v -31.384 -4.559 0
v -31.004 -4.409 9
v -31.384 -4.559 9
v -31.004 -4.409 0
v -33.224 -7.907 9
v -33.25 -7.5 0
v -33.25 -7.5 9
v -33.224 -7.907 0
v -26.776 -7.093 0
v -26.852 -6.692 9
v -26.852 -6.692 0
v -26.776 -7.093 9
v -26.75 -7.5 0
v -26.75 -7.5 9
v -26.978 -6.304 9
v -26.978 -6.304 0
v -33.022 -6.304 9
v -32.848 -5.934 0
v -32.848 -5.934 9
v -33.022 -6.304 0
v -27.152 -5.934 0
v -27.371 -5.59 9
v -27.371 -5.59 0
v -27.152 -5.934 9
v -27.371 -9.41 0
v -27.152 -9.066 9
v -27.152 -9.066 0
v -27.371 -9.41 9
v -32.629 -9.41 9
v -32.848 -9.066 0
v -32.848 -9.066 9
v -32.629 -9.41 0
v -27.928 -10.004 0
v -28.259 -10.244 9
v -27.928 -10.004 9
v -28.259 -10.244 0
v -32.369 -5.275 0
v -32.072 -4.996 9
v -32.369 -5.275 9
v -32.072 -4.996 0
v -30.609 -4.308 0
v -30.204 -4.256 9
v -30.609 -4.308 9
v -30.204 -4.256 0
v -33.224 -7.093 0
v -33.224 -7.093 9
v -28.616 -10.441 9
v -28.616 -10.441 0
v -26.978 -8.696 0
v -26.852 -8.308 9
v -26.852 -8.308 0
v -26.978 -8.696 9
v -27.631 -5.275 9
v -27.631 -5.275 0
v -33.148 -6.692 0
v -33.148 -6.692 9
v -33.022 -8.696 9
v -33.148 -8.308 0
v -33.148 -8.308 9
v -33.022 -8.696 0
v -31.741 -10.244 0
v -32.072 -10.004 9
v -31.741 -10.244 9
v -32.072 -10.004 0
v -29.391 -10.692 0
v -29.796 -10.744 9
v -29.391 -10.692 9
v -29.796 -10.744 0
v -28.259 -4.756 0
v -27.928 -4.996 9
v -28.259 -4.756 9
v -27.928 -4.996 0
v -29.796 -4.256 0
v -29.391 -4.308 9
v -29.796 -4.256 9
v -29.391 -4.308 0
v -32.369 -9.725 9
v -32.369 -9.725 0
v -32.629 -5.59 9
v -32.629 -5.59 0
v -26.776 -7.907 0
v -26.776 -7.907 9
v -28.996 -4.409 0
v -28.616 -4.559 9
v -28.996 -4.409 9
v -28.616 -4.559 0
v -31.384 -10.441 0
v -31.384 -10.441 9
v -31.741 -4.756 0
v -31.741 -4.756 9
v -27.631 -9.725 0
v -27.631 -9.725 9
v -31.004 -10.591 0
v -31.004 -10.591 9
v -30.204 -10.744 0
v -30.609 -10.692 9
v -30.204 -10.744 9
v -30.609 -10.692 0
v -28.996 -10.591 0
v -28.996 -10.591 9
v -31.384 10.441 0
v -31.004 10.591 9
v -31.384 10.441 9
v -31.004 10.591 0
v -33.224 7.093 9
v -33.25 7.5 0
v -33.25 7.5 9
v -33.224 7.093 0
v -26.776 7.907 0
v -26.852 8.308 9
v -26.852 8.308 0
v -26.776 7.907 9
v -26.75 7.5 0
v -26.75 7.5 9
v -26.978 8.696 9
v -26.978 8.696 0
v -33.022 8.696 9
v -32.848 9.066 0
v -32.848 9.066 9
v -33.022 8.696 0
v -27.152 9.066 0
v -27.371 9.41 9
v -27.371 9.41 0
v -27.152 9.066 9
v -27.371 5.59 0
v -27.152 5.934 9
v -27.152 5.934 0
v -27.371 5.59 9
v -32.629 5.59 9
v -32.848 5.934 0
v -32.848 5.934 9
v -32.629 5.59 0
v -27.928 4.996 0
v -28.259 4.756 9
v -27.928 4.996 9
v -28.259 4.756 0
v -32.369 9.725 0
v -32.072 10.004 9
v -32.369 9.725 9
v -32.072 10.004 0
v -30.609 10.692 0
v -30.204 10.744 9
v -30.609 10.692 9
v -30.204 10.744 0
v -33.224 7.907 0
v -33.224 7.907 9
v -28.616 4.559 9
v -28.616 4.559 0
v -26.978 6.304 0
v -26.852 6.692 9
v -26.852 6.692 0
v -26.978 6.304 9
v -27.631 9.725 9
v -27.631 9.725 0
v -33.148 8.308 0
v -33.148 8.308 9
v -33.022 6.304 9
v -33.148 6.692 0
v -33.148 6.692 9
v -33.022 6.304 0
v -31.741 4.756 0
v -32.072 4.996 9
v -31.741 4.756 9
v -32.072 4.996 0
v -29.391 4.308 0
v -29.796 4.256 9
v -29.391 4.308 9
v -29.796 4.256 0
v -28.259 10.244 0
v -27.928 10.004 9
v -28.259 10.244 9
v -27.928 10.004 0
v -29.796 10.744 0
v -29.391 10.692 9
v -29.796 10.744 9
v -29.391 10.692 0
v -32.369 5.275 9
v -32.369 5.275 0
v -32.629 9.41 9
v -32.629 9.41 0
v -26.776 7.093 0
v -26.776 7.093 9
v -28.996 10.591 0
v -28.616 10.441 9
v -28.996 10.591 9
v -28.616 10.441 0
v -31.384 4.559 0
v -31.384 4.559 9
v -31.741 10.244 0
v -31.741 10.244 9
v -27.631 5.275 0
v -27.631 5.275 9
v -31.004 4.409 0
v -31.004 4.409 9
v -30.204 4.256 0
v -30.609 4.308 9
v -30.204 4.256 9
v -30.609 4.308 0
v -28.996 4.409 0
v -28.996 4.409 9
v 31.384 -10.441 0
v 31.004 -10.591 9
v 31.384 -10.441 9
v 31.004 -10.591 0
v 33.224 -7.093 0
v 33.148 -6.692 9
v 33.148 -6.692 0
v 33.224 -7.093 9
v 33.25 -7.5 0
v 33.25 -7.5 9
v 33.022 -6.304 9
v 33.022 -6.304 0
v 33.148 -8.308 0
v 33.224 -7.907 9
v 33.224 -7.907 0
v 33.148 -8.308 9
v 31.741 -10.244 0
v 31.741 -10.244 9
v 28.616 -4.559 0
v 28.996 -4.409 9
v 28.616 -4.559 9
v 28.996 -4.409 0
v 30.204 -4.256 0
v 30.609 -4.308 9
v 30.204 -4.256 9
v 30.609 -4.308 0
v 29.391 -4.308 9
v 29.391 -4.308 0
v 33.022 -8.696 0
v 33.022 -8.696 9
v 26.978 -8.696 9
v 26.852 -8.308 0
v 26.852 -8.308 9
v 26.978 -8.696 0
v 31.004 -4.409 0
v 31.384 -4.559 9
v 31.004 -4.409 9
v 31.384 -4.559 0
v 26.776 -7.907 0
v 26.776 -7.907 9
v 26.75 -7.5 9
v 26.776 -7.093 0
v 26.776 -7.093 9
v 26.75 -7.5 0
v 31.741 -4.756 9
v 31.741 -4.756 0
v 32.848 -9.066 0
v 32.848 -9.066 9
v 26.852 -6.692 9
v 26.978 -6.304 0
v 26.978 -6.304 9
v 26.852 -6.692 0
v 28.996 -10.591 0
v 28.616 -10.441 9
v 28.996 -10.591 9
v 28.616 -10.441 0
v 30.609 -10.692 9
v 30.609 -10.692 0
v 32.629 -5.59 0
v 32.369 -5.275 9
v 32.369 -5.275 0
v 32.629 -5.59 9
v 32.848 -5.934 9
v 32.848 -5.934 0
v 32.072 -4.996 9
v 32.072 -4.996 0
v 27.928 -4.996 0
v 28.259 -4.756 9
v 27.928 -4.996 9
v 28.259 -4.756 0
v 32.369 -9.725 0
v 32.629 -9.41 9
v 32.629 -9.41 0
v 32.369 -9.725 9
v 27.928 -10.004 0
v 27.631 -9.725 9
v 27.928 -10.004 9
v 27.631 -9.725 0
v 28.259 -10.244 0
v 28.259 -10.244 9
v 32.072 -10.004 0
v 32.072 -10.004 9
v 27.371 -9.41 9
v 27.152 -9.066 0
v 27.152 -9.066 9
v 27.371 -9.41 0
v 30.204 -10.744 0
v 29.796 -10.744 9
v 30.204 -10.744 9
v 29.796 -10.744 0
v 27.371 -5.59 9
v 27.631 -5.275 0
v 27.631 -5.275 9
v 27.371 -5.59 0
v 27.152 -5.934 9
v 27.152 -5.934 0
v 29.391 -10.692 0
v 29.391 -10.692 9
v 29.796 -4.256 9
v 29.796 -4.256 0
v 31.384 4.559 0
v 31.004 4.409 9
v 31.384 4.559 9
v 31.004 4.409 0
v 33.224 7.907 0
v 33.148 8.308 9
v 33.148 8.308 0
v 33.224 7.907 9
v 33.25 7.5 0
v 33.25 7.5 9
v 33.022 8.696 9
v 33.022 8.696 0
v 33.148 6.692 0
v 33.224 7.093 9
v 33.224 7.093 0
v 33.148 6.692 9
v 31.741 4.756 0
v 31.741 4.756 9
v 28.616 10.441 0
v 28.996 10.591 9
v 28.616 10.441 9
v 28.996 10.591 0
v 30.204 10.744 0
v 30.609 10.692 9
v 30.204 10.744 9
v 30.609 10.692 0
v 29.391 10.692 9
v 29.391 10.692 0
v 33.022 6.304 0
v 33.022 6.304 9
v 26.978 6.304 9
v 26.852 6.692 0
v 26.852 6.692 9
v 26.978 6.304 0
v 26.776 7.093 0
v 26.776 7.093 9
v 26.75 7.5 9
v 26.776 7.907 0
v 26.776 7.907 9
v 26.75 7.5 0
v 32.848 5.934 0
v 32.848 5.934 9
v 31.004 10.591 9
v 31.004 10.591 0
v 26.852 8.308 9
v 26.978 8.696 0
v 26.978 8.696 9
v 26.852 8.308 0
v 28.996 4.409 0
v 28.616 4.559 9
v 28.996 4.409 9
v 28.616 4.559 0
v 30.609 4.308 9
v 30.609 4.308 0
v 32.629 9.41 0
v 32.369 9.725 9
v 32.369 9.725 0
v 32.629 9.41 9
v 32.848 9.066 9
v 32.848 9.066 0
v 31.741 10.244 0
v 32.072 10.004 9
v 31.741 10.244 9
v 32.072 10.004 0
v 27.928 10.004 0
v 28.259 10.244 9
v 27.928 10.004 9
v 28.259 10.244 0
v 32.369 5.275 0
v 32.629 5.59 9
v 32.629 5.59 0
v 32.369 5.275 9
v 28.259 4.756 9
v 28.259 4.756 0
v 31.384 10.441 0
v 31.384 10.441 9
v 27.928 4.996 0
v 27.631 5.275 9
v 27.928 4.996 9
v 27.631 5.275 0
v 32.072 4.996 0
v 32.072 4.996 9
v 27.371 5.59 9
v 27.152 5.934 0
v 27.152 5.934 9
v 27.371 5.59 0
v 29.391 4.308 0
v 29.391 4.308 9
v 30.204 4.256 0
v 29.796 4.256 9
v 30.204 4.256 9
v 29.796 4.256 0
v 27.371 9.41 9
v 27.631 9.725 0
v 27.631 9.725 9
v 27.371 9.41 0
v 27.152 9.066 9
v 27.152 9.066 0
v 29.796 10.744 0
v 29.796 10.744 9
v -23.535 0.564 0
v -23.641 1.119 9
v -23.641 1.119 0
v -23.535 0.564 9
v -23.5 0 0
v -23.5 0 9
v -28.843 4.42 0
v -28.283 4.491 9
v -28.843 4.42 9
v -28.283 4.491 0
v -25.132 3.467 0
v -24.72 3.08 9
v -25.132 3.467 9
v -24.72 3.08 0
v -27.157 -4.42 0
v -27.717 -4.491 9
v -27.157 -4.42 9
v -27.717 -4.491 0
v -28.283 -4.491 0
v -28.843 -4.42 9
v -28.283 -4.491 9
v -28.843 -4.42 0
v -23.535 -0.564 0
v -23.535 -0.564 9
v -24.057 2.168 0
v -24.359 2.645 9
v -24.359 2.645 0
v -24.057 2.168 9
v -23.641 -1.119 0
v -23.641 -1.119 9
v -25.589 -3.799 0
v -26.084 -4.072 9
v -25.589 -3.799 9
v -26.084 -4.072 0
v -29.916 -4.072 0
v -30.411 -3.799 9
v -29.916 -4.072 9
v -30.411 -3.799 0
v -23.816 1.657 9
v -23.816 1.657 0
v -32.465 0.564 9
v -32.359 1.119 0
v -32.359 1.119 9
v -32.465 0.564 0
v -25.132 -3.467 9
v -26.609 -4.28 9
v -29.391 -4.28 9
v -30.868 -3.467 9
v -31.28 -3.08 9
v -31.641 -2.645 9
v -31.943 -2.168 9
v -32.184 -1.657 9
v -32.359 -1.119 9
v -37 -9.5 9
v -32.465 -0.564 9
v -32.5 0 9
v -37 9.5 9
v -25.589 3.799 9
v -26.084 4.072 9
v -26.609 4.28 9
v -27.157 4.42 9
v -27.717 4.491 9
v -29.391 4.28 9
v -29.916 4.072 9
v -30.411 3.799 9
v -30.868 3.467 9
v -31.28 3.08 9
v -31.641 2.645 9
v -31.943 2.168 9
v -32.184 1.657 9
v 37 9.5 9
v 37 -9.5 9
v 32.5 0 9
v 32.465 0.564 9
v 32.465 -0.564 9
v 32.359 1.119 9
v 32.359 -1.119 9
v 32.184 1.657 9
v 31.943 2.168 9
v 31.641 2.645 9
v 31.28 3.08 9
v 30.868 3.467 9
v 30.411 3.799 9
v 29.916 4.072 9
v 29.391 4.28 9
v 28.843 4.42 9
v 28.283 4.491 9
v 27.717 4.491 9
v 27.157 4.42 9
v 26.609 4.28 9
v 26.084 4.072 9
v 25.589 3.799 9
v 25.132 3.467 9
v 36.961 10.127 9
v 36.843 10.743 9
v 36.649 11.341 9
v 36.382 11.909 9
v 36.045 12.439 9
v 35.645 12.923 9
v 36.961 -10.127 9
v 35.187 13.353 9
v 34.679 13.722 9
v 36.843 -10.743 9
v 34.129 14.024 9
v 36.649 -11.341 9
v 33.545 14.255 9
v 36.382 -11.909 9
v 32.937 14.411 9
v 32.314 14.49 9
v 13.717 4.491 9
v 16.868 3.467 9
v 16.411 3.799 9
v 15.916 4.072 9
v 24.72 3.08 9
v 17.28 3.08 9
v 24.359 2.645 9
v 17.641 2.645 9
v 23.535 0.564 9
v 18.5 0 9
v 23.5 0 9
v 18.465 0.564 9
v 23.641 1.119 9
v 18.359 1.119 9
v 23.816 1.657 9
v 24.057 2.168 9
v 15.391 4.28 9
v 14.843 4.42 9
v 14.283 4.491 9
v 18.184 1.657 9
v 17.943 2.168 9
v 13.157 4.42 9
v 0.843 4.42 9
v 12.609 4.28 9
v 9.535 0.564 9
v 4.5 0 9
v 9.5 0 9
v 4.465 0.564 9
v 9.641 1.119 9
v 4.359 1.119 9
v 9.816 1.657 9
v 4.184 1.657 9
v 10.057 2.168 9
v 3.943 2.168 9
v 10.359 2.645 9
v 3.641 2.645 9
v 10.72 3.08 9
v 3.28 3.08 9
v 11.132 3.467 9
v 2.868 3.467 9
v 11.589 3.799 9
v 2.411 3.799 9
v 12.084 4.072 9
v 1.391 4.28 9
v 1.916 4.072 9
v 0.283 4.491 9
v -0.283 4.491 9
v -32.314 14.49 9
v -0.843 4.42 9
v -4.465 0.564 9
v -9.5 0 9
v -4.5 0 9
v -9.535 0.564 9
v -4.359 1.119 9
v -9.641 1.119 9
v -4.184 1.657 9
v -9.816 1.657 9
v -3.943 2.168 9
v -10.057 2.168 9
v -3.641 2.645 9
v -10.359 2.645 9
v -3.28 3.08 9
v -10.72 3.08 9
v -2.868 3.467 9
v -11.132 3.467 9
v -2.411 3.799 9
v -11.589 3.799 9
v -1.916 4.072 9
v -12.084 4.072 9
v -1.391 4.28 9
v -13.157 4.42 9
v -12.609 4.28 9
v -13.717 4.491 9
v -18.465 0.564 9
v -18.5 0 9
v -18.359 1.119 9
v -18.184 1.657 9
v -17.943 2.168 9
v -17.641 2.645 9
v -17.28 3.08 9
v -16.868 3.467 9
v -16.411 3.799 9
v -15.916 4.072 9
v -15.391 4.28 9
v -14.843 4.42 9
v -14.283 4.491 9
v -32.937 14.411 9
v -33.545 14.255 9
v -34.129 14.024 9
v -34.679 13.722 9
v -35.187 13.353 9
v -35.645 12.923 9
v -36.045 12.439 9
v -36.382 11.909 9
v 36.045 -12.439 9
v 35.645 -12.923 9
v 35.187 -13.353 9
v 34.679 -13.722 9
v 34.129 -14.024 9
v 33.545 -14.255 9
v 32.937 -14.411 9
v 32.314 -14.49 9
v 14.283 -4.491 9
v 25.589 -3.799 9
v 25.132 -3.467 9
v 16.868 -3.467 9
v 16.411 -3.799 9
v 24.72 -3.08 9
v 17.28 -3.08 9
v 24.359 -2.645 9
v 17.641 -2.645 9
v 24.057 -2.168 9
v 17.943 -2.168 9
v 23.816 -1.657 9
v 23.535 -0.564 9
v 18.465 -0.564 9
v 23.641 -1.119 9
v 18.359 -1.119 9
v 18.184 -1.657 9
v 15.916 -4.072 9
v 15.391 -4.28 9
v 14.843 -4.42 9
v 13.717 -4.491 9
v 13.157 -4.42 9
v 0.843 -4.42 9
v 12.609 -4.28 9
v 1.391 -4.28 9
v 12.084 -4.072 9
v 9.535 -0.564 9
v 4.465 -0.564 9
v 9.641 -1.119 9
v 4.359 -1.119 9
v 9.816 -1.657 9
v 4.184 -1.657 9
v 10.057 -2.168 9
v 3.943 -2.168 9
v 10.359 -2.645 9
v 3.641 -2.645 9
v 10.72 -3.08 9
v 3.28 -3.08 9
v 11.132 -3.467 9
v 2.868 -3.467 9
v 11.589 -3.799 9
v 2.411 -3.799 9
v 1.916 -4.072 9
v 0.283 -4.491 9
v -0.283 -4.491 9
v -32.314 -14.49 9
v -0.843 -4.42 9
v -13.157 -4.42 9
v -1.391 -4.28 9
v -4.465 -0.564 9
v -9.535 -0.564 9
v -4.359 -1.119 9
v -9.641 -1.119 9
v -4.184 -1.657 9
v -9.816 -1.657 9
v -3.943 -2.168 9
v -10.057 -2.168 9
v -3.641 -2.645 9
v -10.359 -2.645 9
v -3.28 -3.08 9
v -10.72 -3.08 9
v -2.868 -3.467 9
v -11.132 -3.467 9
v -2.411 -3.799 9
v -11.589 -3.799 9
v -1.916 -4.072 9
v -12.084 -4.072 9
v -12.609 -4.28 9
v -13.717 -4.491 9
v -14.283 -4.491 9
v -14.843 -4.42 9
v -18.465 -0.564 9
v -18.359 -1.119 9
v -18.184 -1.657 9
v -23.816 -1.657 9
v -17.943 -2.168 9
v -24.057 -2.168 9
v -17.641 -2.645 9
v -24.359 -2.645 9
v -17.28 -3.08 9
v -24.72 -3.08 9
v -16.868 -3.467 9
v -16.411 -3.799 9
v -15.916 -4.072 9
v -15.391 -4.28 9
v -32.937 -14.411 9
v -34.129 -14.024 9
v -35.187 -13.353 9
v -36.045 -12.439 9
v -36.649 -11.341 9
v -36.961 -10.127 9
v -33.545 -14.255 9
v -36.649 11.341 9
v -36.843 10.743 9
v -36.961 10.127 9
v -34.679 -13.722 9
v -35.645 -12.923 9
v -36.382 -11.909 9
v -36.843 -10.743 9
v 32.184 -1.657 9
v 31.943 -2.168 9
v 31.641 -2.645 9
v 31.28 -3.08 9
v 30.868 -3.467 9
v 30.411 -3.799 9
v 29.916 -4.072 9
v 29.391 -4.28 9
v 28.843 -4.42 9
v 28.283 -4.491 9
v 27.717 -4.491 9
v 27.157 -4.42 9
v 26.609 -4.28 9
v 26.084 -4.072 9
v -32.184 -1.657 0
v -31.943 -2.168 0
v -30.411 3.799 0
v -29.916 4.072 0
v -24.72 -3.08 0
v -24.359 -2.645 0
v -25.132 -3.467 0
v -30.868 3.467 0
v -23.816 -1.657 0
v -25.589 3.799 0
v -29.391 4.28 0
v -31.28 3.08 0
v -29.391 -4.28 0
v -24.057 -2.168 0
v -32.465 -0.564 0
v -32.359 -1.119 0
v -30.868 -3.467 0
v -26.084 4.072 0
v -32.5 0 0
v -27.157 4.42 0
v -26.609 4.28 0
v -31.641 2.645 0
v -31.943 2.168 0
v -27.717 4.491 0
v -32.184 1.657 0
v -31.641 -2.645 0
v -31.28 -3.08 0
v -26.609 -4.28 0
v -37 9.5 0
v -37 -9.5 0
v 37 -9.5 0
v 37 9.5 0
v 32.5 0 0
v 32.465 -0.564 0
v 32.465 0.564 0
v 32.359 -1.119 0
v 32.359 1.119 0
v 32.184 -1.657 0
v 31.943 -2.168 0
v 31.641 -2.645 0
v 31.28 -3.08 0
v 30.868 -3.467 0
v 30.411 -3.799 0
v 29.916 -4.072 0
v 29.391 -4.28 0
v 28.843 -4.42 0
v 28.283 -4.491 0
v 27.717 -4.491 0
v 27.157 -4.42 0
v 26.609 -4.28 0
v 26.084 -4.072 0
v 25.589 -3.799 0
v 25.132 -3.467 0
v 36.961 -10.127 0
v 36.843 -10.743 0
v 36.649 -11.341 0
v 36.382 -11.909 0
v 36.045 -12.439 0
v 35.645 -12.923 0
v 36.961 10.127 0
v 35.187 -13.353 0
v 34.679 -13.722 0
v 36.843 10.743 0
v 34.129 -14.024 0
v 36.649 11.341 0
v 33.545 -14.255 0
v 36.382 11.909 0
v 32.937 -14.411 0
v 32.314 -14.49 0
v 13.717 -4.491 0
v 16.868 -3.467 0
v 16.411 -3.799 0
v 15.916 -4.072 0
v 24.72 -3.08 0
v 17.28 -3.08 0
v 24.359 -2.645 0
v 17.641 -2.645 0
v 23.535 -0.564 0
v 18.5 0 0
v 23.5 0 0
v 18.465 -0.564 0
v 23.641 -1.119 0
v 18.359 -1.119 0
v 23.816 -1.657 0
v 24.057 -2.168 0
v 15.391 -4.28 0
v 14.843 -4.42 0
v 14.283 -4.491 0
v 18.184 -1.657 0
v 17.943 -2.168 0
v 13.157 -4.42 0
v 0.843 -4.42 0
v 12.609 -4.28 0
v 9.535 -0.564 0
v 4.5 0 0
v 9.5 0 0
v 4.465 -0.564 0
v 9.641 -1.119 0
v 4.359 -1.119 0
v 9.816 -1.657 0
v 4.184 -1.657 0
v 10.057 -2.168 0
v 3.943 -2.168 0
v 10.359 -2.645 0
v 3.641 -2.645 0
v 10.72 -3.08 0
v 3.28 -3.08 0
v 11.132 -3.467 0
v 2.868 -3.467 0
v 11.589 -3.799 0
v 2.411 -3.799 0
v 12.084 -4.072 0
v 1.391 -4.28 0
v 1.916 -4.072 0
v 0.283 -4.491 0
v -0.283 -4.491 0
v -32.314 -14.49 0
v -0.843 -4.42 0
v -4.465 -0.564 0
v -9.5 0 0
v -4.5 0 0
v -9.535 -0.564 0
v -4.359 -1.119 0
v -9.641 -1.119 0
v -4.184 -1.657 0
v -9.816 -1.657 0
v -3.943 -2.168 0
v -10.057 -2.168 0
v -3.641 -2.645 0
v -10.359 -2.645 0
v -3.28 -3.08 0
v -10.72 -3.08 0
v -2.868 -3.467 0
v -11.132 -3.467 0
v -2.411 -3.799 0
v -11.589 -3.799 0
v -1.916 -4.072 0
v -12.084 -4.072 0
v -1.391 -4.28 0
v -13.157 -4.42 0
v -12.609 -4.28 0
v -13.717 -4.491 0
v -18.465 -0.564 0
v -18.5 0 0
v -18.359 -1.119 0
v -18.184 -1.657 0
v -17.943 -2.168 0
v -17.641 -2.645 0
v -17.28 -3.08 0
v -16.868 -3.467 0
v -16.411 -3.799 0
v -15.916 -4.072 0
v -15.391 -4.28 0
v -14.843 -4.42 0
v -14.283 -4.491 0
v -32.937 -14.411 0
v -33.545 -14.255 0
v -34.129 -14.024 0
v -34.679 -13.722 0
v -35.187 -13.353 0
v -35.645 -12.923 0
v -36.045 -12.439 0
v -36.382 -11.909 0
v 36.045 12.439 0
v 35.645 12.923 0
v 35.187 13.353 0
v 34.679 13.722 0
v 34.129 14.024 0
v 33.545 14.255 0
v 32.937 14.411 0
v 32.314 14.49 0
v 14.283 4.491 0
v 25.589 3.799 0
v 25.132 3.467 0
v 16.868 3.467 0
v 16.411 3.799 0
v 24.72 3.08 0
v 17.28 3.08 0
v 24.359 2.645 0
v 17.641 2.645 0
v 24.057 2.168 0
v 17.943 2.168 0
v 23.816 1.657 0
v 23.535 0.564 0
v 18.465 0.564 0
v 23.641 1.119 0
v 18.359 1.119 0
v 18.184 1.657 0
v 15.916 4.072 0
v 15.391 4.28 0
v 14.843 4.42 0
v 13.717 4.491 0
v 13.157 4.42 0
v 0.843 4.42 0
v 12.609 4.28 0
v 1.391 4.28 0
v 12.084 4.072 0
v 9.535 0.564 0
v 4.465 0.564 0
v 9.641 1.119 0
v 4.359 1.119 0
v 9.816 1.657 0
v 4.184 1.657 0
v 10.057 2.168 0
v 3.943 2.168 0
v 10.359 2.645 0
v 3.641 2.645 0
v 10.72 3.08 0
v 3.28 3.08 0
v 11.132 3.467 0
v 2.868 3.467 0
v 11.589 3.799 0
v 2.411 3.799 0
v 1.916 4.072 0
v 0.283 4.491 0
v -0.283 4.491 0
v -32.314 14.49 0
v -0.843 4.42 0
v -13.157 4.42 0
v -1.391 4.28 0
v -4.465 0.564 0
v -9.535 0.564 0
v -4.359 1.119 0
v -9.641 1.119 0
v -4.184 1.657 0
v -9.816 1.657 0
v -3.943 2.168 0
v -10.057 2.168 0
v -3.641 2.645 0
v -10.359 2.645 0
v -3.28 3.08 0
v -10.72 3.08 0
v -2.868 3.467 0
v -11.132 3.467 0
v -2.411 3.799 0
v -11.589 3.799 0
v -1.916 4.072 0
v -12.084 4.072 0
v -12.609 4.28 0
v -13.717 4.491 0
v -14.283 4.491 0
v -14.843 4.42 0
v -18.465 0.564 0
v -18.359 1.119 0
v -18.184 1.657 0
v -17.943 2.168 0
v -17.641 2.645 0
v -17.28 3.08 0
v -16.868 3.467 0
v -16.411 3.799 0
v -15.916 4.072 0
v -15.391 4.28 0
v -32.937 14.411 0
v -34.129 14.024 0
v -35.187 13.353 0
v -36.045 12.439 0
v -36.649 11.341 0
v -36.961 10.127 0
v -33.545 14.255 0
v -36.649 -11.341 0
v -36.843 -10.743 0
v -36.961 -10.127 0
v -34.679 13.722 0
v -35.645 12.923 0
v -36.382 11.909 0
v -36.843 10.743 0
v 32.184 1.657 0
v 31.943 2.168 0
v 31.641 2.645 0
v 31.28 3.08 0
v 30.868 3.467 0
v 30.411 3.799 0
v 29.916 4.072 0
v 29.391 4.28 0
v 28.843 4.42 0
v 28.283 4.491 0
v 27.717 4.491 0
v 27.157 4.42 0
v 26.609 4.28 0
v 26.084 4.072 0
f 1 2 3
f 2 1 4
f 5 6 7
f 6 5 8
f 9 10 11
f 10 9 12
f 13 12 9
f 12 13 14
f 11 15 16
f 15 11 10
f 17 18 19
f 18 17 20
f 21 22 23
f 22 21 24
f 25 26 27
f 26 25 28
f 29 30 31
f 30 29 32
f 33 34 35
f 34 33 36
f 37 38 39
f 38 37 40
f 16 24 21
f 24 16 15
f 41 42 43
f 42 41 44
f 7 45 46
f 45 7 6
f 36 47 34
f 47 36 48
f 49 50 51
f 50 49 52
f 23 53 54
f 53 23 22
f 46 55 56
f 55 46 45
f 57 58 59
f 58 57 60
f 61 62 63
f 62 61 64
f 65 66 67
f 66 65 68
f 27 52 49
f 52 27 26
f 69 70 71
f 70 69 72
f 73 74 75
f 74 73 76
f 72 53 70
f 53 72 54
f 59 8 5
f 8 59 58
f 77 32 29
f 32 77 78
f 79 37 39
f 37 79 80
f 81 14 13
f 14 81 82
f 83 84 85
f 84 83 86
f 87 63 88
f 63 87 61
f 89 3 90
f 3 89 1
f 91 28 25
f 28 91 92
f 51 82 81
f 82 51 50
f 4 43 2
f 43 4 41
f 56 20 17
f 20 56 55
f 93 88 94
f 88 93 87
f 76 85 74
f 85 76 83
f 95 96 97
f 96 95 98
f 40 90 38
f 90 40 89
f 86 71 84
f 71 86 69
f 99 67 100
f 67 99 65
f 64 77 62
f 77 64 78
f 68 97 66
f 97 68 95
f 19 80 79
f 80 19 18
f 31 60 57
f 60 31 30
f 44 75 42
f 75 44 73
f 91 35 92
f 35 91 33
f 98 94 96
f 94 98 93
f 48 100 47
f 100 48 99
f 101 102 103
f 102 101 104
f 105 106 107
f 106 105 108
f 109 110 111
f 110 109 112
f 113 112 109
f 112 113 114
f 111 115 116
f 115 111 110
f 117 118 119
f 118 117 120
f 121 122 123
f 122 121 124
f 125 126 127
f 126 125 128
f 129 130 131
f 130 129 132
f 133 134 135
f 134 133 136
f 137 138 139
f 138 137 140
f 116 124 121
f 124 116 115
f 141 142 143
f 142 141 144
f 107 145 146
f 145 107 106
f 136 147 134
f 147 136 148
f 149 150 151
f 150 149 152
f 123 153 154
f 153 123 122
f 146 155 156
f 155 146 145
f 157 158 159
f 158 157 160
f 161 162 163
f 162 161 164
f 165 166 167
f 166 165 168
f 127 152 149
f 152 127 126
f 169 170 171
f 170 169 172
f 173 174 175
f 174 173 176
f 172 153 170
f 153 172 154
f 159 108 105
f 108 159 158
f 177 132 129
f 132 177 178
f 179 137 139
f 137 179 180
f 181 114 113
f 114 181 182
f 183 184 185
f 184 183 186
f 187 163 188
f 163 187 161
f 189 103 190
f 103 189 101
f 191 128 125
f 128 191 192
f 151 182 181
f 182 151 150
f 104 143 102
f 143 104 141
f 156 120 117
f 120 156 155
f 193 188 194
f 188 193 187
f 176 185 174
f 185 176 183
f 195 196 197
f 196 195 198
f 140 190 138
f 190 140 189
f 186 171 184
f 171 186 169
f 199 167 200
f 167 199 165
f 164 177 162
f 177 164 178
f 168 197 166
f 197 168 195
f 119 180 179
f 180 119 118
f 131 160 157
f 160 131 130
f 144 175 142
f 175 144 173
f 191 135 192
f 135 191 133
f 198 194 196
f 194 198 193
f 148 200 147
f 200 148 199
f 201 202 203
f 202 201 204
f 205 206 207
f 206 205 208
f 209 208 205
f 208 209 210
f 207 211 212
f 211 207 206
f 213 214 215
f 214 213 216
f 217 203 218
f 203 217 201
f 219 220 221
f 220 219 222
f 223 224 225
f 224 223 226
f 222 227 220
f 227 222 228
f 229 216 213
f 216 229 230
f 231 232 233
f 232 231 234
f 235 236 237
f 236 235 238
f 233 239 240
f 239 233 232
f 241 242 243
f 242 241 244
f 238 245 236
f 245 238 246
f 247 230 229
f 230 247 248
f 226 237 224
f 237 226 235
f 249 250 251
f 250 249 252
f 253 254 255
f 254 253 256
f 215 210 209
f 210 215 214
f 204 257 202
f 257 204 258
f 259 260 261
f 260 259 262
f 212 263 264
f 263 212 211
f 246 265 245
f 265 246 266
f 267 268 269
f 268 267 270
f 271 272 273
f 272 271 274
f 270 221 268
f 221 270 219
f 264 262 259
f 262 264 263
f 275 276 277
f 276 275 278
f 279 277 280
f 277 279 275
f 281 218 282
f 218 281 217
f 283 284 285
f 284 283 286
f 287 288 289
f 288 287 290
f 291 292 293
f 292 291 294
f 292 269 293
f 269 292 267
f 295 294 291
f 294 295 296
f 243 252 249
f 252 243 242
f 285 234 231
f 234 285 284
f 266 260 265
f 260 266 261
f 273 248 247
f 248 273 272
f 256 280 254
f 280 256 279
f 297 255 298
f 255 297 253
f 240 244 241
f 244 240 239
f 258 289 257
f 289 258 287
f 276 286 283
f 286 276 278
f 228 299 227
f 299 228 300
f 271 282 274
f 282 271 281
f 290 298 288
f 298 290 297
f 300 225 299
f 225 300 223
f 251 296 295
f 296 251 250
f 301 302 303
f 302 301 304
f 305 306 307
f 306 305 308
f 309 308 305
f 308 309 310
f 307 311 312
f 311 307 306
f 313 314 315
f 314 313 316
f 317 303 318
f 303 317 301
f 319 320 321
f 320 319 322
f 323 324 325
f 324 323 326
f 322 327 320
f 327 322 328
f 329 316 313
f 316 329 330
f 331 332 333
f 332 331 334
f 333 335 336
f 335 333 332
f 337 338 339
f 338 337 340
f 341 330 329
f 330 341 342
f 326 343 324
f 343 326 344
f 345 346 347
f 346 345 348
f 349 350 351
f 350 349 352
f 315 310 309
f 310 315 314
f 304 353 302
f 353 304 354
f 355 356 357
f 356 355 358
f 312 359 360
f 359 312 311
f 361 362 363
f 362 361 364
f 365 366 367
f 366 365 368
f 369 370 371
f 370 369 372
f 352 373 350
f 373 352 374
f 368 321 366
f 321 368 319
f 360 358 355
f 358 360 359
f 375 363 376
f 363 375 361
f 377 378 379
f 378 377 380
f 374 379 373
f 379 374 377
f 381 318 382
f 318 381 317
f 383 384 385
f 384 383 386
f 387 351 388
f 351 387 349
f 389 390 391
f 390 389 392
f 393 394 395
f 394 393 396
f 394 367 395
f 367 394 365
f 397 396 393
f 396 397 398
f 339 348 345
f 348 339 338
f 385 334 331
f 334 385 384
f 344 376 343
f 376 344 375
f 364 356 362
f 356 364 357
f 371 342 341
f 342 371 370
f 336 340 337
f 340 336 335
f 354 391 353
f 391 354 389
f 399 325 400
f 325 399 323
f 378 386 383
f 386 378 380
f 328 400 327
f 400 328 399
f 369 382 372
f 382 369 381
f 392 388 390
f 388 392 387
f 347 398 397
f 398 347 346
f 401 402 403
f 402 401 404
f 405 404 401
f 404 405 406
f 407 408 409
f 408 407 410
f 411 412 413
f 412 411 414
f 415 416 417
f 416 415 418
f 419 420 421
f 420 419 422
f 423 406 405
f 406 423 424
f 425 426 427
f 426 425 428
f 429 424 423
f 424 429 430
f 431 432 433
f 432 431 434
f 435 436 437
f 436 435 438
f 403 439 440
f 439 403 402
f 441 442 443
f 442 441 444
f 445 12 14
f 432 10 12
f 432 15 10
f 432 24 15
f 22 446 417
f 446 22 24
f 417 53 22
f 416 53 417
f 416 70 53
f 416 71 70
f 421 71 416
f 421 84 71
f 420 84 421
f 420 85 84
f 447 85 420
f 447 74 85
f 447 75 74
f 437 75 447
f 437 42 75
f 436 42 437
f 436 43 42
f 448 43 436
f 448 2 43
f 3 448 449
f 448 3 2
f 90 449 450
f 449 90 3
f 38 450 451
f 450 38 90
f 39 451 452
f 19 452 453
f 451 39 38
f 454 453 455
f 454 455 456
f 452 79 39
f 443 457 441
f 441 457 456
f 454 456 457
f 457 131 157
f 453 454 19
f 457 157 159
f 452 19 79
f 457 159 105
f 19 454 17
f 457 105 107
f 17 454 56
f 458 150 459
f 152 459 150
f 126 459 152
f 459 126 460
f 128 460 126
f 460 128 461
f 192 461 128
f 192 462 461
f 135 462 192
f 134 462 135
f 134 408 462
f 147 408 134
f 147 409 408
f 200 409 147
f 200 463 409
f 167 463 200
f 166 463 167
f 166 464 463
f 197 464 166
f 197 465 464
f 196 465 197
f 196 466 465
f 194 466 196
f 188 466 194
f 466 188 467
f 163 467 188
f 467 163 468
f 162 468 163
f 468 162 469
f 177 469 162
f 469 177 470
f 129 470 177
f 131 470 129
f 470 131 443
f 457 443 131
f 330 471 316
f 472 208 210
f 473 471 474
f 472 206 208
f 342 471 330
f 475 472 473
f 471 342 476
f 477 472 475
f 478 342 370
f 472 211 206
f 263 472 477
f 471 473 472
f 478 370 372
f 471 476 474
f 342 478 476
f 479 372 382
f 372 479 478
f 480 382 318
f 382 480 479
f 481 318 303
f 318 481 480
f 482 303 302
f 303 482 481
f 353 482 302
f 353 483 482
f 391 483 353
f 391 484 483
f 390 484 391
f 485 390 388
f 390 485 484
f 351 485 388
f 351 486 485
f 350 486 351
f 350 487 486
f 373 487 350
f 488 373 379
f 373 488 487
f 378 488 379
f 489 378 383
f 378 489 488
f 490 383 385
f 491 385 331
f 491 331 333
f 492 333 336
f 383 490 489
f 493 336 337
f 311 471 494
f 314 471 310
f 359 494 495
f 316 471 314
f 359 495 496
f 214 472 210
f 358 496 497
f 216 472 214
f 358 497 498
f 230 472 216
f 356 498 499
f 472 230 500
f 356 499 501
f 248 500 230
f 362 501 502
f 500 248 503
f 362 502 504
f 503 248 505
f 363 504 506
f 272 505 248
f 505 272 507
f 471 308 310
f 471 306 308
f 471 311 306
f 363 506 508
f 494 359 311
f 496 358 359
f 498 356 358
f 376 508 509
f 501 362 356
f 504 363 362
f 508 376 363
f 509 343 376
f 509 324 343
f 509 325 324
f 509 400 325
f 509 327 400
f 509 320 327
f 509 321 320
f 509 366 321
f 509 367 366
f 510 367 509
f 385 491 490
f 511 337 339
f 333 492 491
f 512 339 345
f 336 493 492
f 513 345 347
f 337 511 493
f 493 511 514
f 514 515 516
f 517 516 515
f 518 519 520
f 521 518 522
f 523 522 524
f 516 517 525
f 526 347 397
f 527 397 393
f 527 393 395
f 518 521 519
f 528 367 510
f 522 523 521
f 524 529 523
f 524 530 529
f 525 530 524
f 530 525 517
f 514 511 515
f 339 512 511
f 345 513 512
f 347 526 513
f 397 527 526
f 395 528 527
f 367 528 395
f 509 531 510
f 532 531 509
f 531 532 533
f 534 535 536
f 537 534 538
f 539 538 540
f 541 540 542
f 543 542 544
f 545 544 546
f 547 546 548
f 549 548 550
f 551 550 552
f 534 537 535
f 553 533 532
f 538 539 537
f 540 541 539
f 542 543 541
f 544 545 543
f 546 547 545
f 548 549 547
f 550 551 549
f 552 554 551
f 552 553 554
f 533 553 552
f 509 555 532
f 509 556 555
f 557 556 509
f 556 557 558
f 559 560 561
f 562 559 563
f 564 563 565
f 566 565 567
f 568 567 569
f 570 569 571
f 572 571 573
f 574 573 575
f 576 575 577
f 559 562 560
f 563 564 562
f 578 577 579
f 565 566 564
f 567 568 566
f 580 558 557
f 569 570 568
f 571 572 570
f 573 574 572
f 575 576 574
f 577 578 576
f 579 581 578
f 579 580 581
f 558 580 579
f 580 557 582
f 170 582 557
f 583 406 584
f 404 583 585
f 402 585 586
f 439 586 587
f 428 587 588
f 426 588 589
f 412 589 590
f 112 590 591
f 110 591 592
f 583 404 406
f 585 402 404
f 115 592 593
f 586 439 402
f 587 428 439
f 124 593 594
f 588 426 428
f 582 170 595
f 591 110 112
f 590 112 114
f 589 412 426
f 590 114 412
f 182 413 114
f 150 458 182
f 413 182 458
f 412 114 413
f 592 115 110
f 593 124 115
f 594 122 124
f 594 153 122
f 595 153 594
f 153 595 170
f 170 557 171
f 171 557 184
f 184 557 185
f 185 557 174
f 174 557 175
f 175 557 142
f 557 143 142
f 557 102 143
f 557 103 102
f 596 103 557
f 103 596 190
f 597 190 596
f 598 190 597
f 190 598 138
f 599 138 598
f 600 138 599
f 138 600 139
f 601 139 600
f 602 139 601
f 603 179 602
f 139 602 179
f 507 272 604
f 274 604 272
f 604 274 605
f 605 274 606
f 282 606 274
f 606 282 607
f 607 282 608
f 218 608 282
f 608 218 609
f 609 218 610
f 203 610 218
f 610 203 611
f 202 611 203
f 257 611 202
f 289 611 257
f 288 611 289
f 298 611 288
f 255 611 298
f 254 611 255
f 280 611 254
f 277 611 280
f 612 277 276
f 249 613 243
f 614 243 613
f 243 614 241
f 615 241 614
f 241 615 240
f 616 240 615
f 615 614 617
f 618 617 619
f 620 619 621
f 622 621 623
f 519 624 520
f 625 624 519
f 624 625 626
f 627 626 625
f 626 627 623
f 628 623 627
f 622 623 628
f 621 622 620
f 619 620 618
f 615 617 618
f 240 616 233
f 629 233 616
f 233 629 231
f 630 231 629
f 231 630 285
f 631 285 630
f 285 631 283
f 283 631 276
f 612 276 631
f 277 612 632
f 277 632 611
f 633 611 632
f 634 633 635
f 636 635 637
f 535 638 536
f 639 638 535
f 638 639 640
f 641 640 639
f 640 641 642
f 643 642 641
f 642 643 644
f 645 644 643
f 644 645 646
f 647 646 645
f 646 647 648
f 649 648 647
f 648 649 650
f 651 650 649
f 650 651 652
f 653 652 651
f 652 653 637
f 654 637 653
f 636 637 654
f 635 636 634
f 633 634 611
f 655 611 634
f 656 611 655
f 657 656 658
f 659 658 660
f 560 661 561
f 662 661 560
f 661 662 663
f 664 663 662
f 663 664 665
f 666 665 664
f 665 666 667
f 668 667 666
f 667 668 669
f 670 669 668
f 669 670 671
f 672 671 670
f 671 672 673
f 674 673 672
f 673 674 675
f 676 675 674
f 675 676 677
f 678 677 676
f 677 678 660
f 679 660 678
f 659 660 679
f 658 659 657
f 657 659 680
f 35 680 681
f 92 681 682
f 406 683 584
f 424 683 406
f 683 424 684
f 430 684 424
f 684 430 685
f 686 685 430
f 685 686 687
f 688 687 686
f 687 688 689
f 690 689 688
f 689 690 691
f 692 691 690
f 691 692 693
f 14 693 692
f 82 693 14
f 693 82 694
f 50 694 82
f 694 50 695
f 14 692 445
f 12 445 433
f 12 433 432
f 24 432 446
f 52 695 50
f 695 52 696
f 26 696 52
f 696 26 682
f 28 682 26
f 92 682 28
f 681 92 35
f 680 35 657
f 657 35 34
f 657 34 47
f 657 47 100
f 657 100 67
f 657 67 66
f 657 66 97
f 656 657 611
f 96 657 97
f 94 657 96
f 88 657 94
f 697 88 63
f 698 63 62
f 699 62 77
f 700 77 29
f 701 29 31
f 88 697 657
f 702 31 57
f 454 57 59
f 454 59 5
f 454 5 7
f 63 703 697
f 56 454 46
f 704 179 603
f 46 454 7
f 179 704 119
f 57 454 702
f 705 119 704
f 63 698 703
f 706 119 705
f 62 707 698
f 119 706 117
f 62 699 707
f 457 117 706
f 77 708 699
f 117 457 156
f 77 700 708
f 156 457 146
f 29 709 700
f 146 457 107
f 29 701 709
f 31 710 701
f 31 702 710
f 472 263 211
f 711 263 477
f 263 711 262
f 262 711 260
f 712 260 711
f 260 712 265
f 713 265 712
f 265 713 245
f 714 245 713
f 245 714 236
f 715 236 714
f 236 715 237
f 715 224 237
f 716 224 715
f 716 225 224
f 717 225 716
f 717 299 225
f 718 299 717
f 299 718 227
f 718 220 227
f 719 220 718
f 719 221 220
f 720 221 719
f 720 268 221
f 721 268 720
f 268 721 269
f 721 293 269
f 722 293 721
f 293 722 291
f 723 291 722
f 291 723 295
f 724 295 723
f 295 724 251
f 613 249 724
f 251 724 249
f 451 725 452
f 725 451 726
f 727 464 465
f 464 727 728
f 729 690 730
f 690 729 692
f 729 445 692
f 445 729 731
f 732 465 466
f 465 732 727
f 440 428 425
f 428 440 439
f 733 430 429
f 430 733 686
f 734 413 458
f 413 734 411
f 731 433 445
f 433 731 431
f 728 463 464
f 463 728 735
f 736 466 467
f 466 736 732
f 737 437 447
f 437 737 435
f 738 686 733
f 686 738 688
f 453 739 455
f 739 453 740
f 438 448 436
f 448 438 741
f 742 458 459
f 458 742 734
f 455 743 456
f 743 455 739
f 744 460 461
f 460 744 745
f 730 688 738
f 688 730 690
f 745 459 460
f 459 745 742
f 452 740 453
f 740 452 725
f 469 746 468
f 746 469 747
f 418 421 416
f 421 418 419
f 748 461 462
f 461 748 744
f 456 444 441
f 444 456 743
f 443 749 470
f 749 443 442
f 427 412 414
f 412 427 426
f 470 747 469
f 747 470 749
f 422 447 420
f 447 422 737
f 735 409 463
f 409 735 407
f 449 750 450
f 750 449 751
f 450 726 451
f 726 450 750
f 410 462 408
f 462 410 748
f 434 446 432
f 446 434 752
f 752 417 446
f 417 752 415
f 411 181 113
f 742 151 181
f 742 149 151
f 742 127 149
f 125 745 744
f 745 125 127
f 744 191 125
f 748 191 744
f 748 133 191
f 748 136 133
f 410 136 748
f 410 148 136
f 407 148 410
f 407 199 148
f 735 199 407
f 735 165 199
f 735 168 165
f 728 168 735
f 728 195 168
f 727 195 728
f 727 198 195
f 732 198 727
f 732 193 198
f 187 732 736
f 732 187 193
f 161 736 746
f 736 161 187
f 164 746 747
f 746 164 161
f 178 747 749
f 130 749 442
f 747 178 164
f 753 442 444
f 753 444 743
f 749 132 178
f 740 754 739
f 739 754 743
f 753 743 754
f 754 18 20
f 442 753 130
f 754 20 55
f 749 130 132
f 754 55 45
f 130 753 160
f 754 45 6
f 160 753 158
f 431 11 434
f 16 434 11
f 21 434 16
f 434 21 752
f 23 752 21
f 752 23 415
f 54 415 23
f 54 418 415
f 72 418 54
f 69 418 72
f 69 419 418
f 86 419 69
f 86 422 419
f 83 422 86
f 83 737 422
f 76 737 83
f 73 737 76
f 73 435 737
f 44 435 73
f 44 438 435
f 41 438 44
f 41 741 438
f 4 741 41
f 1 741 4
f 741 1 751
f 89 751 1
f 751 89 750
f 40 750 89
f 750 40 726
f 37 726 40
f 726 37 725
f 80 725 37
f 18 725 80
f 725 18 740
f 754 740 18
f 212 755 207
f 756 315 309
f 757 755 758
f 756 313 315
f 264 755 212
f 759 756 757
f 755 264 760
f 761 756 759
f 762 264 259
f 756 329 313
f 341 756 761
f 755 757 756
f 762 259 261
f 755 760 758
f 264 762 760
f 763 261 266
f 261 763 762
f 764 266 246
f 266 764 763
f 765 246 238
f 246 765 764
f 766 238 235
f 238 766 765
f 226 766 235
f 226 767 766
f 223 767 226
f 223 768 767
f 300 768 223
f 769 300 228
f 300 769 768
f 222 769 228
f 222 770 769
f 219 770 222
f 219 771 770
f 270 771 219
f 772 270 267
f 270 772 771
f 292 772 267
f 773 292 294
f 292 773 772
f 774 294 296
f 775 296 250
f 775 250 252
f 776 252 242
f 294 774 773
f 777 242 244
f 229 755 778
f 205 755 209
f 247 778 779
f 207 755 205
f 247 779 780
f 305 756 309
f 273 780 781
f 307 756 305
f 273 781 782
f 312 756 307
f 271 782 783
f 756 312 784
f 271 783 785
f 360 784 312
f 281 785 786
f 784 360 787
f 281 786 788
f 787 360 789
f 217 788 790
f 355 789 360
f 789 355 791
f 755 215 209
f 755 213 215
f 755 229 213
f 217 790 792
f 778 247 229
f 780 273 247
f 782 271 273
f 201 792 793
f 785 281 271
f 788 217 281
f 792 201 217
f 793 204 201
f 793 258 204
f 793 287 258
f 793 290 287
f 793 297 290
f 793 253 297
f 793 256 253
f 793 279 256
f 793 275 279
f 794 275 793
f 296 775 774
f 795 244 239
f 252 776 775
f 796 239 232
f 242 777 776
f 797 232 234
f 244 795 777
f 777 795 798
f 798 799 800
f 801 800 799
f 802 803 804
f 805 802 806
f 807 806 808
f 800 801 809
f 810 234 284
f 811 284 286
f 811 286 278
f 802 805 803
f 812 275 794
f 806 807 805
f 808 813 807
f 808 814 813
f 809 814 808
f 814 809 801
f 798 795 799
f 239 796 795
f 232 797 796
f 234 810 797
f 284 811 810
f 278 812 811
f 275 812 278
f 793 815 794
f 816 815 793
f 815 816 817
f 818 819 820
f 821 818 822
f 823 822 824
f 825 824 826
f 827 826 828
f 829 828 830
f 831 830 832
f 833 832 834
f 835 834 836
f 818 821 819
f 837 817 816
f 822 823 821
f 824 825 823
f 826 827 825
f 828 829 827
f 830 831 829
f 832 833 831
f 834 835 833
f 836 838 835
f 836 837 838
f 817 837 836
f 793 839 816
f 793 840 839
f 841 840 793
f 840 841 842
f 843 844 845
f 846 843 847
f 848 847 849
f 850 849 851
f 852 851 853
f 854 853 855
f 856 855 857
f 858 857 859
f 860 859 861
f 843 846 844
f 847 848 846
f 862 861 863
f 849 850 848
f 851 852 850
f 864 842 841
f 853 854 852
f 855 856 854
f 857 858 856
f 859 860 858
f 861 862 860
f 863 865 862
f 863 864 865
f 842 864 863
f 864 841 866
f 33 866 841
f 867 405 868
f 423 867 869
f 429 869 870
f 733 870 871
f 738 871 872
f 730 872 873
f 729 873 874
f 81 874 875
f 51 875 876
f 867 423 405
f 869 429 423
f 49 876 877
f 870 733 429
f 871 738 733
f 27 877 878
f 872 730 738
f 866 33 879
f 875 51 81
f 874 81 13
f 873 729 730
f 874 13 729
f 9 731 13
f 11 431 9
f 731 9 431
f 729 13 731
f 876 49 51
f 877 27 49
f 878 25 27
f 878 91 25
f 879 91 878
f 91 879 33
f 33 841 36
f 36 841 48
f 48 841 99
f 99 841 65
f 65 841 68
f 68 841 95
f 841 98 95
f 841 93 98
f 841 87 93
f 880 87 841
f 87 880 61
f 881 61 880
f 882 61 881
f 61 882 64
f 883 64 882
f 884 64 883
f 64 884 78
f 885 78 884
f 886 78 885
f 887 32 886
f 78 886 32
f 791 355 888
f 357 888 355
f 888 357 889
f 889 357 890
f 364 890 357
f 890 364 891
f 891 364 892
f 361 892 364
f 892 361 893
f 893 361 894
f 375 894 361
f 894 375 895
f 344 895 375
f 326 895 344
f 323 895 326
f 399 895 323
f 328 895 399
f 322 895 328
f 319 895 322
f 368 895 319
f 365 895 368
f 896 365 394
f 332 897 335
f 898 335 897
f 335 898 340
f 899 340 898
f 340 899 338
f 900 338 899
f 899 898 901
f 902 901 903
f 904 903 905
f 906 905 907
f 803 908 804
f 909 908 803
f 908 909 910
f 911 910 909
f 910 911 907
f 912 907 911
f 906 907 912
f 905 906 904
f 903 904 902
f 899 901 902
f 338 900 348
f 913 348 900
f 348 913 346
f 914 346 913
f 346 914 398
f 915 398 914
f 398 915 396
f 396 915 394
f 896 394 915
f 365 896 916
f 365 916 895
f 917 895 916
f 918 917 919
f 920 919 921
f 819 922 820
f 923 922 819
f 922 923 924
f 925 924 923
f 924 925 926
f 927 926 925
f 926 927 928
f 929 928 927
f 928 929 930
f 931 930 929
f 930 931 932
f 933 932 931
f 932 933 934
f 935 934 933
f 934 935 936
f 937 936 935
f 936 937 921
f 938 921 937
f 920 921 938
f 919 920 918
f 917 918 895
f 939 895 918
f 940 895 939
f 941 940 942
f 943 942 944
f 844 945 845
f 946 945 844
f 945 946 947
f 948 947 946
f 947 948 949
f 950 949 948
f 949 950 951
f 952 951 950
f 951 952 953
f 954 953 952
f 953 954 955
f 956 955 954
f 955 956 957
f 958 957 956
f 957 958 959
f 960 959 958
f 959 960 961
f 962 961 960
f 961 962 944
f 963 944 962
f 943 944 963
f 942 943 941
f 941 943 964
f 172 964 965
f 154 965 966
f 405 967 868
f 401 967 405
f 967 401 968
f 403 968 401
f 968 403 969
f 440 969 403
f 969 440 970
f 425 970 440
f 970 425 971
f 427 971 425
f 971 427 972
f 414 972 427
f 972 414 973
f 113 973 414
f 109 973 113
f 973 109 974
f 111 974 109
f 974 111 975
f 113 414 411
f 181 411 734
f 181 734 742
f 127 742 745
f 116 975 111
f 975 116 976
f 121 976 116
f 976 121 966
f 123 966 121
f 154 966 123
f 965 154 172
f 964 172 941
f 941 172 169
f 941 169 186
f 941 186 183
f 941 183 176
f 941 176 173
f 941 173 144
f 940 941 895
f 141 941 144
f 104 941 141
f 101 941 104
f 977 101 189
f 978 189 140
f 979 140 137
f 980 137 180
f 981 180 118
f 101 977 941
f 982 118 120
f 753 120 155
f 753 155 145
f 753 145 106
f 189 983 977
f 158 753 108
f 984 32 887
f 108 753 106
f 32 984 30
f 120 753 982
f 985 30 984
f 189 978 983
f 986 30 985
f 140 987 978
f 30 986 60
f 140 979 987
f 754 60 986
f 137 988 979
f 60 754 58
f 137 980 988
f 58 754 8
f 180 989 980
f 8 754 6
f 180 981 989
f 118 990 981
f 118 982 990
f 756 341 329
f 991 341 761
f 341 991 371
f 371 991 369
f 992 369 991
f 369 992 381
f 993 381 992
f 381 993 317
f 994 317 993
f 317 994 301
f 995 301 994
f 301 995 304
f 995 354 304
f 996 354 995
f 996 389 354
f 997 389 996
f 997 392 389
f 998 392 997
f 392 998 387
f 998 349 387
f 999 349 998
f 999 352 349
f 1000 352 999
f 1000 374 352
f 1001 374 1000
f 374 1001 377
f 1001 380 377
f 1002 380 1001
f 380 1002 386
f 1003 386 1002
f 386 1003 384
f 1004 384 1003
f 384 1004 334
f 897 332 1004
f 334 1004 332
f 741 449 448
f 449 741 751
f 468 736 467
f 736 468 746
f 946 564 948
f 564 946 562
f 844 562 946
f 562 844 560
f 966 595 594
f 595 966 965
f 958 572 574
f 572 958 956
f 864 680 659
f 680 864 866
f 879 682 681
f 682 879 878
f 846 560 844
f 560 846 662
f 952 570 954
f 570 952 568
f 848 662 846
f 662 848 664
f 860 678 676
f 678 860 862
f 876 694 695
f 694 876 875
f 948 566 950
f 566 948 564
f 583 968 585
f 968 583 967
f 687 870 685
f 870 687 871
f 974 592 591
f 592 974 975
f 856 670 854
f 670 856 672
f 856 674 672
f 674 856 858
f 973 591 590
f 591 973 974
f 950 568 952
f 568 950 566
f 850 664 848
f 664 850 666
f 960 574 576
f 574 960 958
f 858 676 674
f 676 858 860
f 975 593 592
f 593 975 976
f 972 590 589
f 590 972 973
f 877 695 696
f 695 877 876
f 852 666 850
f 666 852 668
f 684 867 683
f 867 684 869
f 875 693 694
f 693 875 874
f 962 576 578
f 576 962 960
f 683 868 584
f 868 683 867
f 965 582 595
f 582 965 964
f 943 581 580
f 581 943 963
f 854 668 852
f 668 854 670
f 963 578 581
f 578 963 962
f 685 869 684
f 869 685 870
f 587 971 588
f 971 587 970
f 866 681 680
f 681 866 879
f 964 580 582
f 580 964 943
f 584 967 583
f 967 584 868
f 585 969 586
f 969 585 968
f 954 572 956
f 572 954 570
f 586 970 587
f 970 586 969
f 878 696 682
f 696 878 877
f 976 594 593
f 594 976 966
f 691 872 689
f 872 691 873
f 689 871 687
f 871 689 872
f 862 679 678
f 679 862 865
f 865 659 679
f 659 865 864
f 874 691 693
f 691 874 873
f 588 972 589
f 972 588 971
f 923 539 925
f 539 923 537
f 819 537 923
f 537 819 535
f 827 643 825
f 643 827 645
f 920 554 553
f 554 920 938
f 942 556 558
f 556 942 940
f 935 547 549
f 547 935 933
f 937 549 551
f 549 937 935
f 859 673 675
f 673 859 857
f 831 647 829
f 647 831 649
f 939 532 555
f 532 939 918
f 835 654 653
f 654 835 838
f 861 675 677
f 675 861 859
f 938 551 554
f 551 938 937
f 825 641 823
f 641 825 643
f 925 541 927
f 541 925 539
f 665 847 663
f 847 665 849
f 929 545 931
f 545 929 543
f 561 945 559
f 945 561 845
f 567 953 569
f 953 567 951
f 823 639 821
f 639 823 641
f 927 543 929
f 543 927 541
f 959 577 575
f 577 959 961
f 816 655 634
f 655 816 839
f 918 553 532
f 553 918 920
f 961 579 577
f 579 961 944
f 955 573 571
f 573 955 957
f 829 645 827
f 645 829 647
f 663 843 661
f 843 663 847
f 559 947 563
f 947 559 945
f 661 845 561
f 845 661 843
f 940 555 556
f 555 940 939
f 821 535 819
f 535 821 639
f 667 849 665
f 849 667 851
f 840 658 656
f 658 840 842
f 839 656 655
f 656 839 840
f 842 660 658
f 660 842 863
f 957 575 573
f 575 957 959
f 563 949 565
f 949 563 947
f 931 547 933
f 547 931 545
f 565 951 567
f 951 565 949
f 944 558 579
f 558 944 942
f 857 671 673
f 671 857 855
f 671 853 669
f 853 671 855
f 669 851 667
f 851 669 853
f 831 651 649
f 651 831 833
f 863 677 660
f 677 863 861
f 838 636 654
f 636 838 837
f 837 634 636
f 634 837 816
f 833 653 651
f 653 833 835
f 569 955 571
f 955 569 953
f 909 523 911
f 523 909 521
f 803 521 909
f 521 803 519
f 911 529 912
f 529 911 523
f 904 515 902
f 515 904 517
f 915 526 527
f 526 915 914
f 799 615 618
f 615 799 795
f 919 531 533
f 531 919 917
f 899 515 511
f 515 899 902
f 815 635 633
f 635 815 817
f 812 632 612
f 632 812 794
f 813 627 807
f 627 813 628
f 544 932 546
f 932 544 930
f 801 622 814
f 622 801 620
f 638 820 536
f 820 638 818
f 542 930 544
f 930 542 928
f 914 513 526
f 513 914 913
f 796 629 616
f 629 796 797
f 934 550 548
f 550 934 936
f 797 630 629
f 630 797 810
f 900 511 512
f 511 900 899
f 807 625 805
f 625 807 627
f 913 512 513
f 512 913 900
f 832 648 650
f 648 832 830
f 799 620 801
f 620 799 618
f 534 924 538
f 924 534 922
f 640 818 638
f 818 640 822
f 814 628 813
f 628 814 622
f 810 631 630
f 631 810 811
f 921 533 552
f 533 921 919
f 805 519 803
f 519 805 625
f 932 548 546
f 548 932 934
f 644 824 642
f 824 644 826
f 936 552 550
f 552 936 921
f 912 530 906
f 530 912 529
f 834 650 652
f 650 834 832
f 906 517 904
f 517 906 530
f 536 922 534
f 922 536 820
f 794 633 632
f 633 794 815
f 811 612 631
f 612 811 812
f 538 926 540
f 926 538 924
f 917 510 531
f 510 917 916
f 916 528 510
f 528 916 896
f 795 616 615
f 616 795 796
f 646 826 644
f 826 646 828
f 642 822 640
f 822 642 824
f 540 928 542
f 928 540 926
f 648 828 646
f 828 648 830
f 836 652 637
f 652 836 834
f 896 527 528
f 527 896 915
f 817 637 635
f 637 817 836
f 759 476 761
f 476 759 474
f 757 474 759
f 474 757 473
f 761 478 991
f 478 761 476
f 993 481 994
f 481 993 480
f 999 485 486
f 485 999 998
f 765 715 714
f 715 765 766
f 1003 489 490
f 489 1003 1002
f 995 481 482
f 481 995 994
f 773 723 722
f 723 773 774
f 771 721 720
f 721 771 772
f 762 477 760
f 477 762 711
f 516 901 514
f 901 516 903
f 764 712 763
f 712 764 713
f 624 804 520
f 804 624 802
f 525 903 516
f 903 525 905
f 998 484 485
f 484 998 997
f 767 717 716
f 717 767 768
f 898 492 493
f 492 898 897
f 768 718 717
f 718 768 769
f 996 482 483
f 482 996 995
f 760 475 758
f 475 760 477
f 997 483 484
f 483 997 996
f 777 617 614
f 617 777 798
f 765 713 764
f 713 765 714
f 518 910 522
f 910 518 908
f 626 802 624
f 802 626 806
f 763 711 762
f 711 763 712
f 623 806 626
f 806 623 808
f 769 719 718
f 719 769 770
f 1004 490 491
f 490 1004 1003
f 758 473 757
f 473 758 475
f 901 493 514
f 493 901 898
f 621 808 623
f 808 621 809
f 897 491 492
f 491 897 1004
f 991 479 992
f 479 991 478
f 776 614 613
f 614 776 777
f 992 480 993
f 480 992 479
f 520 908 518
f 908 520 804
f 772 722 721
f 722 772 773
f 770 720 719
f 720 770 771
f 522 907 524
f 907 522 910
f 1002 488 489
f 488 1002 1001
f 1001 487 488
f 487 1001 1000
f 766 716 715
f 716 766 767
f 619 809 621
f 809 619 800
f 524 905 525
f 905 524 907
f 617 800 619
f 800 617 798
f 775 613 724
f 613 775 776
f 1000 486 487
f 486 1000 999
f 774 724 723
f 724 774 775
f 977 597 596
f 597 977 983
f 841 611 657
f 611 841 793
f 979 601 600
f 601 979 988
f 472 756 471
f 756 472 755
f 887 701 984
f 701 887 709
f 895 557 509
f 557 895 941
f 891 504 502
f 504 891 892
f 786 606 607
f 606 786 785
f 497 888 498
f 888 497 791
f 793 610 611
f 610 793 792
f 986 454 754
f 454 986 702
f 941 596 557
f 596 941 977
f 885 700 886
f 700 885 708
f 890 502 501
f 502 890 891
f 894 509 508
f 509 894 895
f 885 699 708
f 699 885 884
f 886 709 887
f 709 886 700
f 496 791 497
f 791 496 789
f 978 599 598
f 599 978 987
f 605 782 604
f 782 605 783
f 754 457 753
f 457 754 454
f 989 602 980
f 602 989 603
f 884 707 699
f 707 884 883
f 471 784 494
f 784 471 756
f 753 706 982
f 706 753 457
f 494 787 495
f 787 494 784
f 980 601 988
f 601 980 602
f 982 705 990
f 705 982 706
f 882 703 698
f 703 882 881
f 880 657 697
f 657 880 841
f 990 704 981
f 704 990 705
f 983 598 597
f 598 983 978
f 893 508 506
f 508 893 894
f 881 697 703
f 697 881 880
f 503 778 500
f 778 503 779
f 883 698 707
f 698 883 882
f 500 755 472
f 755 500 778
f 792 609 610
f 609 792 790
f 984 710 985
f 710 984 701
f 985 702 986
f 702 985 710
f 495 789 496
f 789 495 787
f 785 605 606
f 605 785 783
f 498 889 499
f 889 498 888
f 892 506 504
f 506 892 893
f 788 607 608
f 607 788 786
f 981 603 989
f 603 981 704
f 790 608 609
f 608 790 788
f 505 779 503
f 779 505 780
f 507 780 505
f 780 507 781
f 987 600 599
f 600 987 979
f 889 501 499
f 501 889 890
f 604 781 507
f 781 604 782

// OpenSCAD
$fn = 50;

difference() {
	union() {
		hull() {
			translate(v = [-32.0, 9.5, 0]) {
				cylinder(h = 9, r = 5);
			}
			translate(v = [32.0, 9.5, 0]) {
				cylinder(h = 9, r = 5);
			}
			translate(v = [-32.0, -9.5, 0]) {
				cylinder(h = 9, r = 5);
			}
			translate(v = [32.0, -9.5, 0]) {
				cylinder(h = 9, r = 5);
			}
		}
	}
	union() {
		translate(v = [-30.0, -7.5, -100.0]) {
			cylinder(h = 200, r = 3.25);
		}
		translate(v = [-30.0, 7.5, -100.0]) {
			cylinder(h = 200, r = 3.25);
		}
		translate(v = [30.0, -7.5, -100.0]) {
			cylinder(h = 200, r = 3.25);
		}
		translate(v = [30.0, 7.5, -100.0]) {
			cylinder(h = 200, r = 3.25);
		}
		translate(v = [-30.0, -7.5, -100.0]) {
			cylinder(h = 200, r = 1.8);
		}
		translate(v = [-30.0, 7.5, -100.0]) {
			cylinder(h = 200, r = 1.8);
		}
		translate(v = [30.0, -7.5, -100.0]) {
			cylinder(h = 200, r = 1.8);
		}
		translate(v = [30.0, 7.5, -100.0]) {
			cylinder(h = 200, r = 1.8);
		}
		translate(v = [-28.0, 0, 0.0]) {
			cylinder(h = 9, r = 4.5);
		}
		translate(v = [-14.0, 0, 0.0]) {
			cylinder(h = 9, r = 4.5);
		}
		cylinder(h = 9, r = 4.5);
		translate(v = [14.0, 0, 0.0]) {
			cylinder(h = 9, r = 4.5);
		}
		translate(v = [28.0, 0, 0.0]) {
			cylinder(h = 9, r = 4.5);
		}
	}
}
